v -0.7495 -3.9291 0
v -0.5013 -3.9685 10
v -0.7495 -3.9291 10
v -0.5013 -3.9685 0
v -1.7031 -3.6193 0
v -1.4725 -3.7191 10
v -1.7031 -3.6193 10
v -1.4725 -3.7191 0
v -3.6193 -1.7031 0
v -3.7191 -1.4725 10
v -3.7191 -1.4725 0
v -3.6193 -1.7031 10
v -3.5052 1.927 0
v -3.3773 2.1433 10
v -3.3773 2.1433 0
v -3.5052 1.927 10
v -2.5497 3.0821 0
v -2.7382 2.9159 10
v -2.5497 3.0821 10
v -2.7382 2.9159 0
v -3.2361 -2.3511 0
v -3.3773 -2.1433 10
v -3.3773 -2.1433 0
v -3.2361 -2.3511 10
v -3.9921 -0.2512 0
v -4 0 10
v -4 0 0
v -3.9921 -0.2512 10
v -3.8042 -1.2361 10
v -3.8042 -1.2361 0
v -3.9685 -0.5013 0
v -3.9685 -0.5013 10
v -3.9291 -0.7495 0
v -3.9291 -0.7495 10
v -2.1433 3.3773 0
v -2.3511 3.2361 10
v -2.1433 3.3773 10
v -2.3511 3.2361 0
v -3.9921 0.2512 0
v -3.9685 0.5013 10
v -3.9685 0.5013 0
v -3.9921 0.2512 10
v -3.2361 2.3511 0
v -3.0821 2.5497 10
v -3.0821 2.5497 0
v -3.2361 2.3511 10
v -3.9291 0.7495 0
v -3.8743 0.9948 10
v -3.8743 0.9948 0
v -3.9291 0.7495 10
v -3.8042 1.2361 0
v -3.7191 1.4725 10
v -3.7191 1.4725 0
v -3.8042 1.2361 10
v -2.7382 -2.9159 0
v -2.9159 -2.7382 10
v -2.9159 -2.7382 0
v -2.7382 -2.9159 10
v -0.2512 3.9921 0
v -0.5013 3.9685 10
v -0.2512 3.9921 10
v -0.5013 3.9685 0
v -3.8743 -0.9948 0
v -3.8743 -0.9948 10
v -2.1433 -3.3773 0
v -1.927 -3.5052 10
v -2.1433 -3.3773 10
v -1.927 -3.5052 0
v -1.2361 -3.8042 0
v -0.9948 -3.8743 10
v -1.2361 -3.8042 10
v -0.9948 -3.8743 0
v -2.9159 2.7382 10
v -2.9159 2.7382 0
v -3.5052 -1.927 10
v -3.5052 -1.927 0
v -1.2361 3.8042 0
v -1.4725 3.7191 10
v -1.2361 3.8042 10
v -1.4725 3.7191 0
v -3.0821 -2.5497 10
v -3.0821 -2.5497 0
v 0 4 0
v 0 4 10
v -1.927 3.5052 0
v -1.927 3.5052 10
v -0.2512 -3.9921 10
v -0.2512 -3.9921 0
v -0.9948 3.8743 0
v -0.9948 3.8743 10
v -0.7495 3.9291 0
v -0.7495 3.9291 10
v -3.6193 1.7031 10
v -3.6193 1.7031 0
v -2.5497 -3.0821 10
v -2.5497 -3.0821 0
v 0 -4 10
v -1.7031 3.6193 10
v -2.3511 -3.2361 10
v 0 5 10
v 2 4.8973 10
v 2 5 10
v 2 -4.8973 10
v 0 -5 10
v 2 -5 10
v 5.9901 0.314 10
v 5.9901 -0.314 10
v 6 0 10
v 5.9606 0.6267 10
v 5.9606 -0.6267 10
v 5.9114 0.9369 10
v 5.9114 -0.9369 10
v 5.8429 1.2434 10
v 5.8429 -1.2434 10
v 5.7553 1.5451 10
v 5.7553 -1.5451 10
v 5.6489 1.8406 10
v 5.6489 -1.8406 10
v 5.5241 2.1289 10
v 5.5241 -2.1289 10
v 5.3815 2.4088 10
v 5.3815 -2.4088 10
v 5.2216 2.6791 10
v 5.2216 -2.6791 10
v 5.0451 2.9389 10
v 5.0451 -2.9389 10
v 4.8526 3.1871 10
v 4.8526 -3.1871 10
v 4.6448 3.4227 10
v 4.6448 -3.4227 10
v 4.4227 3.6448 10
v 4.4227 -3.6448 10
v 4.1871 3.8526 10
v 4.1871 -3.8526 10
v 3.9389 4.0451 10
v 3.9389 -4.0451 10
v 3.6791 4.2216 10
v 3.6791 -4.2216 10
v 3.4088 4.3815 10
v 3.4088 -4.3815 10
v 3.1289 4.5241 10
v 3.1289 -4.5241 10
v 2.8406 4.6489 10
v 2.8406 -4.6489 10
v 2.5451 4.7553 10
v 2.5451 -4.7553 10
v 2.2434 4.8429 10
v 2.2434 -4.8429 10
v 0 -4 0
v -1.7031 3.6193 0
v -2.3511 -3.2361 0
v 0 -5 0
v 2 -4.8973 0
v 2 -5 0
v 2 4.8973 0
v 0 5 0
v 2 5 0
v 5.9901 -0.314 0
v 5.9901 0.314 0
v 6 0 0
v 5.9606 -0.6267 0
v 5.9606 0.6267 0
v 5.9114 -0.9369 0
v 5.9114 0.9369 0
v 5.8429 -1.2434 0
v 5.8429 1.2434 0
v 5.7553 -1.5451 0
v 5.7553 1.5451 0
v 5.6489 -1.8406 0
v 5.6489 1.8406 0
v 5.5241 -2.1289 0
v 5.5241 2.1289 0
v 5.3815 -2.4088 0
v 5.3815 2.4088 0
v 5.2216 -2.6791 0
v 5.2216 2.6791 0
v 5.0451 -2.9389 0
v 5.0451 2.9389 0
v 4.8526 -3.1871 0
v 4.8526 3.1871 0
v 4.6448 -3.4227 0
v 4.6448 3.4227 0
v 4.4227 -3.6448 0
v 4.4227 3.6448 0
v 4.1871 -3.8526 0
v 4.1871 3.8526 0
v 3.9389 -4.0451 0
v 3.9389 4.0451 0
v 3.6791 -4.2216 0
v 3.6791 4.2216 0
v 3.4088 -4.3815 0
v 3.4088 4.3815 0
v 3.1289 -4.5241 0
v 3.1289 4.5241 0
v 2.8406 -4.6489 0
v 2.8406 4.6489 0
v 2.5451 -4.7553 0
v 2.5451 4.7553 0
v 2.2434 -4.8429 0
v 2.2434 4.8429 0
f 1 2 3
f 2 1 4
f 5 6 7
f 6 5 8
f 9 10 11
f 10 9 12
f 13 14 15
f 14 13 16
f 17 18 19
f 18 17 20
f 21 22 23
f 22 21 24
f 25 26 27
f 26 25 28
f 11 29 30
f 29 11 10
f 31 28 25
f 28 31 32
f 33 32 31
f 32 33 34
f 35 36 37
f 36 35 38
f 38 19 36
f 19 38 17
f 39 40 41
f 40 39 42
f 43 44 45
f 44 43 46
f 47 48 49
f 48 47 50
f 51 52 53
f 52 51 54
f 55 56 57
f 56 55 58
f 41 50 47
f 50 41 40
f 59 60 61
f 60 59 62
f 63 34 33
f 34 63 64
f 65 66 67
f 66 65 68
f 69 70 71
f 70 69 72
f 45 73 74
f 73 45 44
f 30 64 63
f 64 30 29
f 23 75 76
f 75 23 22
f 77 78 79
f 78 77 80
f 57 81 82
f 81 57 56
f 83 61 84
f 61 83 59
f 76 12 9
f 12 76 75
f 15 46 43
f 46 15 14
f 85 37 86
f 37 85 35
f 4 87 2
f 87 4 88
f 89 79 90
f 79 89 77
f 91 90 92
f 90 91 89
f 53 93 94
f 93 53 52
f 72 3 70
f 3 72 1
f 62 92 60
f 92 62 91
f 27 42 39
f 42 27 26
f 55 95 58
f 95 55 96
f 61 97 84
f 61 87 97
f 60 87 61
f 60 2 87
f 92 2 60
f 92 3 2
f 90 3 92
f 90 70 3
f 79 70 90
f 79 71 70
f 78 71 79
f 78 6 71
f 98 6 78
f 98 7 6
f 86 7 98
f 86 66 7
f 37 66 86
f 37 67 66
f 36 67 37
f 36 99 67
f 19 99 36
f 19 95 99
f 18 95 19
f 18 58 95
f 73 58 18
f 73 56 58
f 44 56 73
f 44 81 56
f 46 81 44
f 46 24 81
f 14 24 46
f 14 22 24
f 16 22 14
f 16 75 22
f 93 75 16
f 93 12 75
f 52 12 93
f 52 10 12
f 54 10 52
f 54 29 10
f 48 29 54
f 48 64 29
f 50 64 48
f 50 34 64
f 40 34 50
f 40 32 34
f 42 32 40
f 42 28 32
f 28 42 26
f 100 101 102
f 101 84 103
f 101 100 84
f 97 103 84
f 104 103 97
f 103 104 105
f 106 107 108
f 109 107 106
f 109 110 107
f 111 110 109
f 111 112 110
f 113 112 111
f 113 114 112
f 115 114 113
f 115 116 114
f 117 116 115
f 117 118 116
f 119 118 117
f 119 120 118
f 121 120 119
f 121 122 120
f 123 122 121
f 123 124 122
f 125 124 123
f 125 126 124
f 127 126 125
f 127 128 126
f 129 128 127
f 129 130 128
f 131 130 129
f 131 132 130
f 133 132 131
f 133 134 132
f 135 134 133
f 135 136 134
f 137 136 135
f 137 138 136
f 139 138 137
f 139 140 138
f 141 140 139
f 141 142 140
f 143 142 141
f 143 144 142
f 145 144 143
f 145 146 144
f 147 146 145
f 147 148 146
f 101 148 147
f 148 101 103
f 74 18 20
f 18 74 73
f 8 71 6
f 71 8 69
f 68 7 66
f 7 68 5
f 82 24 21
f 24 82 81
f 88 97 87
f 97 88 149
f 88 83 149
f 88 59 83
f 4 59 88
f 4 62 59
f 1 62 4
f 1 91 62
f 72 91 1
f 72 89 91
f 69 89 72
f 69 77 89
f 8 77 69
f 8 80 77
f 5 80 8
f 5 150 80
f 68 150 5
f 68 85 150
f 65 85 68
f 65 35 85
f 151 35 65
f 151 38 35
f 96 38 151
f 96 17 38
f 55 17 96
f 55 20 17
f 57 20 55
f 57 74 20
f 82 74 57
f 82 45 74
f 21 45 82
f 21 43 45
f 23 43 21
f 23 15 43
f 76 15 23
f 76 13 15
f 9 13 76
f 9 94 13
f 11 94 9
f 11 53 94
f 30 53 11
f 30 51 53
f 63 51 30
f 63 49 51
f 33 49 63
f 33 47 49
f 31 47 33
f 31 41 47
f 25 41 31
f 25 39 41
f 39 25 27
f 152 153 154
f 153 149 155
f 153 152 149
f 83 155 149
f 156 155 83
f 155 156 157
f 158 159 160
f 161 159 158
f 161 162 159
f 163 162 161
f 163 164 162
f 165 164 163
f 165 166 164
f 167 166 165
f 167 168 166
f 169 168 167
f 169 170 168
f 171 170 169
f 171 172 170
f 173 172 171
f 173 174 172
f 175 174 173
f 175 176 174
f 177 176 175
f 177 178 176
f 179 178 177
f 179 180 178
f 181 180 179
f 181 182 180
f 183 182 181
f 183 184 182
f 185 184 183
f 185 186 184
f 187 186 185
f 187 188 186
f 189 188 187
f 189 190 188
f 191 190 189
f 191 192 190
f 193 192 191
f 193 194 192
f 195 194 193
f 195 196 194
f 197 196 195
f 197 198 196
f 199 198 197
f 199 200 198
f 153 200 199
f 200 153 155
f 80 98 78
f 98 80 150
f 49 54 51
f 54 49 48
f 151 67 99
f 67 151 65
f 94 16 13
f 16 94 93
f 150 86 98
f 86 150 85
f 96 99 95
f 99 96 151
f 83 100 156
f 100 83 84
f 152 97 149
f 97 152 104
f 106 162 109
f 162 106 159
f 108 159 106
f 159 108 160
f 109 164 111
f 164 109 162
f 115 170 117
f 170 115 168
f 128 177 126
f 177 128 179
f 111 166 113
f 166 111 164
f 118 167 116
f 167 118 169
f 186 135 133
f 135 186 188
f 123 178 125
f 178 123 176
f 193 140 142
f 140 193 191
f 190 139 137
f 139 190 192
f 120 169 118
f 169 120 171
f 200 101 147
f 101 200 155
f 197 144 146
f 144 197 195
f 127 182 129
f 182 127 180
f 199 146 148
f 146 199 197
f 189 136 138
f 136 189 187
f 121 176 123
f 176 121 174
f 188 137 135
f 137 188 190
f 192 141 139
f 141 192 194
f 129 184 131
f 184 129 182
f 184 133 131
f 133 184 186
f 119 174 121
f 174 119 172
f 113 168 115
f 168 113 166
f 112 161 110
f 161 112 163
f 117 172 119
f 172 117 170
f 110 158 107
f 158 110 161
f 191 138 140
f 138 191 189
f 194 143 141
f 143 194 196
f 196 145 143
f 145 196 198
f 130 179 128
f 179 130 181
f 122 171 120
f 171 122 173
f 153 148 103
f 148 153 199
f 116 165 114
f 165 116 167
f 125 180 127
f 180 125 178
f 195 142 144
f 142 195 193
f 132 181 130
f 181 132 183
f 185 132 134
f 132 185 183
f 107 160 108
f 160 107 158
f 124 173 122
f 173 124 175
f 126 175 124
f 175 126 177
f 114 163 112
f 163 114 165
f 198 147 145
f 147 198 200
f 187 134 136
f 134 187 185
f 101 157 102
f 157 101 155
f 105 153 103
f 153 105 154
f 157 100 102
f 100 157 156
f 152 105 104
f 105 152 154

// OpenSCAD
function bearingOuterDiameter() = 8; //The diameter of the circle facing the shackle
function bearingInnerDiameter() = 10; //The diameter of the circle facing the core


$fn=100;

height = 10;

module bearing(){

  difference(){
    cylinder(d=bearingOuterDiameter(),h=height);
    translate([0,-bearingOuterDiameter()/2,0])
      cube([bearingOuterDiameter(),bearingOuterDiameter(),height]);
  }
  
  translate([0,-bearingInnerDiameter()/2,0])
    cube([2,bearingInnerDiameter(),height]);
  translate([1,0,0])
    difference(){  
       cylinder(d=bearingInnerDiameter(),h=height);
       translate([-bearingInnerDiameter(),-bearingInnerDiameter()/2,0])
         cube([bearingInnerDiameter(),bearingInnerDiameter(),height]);
    }

}

bearing();
